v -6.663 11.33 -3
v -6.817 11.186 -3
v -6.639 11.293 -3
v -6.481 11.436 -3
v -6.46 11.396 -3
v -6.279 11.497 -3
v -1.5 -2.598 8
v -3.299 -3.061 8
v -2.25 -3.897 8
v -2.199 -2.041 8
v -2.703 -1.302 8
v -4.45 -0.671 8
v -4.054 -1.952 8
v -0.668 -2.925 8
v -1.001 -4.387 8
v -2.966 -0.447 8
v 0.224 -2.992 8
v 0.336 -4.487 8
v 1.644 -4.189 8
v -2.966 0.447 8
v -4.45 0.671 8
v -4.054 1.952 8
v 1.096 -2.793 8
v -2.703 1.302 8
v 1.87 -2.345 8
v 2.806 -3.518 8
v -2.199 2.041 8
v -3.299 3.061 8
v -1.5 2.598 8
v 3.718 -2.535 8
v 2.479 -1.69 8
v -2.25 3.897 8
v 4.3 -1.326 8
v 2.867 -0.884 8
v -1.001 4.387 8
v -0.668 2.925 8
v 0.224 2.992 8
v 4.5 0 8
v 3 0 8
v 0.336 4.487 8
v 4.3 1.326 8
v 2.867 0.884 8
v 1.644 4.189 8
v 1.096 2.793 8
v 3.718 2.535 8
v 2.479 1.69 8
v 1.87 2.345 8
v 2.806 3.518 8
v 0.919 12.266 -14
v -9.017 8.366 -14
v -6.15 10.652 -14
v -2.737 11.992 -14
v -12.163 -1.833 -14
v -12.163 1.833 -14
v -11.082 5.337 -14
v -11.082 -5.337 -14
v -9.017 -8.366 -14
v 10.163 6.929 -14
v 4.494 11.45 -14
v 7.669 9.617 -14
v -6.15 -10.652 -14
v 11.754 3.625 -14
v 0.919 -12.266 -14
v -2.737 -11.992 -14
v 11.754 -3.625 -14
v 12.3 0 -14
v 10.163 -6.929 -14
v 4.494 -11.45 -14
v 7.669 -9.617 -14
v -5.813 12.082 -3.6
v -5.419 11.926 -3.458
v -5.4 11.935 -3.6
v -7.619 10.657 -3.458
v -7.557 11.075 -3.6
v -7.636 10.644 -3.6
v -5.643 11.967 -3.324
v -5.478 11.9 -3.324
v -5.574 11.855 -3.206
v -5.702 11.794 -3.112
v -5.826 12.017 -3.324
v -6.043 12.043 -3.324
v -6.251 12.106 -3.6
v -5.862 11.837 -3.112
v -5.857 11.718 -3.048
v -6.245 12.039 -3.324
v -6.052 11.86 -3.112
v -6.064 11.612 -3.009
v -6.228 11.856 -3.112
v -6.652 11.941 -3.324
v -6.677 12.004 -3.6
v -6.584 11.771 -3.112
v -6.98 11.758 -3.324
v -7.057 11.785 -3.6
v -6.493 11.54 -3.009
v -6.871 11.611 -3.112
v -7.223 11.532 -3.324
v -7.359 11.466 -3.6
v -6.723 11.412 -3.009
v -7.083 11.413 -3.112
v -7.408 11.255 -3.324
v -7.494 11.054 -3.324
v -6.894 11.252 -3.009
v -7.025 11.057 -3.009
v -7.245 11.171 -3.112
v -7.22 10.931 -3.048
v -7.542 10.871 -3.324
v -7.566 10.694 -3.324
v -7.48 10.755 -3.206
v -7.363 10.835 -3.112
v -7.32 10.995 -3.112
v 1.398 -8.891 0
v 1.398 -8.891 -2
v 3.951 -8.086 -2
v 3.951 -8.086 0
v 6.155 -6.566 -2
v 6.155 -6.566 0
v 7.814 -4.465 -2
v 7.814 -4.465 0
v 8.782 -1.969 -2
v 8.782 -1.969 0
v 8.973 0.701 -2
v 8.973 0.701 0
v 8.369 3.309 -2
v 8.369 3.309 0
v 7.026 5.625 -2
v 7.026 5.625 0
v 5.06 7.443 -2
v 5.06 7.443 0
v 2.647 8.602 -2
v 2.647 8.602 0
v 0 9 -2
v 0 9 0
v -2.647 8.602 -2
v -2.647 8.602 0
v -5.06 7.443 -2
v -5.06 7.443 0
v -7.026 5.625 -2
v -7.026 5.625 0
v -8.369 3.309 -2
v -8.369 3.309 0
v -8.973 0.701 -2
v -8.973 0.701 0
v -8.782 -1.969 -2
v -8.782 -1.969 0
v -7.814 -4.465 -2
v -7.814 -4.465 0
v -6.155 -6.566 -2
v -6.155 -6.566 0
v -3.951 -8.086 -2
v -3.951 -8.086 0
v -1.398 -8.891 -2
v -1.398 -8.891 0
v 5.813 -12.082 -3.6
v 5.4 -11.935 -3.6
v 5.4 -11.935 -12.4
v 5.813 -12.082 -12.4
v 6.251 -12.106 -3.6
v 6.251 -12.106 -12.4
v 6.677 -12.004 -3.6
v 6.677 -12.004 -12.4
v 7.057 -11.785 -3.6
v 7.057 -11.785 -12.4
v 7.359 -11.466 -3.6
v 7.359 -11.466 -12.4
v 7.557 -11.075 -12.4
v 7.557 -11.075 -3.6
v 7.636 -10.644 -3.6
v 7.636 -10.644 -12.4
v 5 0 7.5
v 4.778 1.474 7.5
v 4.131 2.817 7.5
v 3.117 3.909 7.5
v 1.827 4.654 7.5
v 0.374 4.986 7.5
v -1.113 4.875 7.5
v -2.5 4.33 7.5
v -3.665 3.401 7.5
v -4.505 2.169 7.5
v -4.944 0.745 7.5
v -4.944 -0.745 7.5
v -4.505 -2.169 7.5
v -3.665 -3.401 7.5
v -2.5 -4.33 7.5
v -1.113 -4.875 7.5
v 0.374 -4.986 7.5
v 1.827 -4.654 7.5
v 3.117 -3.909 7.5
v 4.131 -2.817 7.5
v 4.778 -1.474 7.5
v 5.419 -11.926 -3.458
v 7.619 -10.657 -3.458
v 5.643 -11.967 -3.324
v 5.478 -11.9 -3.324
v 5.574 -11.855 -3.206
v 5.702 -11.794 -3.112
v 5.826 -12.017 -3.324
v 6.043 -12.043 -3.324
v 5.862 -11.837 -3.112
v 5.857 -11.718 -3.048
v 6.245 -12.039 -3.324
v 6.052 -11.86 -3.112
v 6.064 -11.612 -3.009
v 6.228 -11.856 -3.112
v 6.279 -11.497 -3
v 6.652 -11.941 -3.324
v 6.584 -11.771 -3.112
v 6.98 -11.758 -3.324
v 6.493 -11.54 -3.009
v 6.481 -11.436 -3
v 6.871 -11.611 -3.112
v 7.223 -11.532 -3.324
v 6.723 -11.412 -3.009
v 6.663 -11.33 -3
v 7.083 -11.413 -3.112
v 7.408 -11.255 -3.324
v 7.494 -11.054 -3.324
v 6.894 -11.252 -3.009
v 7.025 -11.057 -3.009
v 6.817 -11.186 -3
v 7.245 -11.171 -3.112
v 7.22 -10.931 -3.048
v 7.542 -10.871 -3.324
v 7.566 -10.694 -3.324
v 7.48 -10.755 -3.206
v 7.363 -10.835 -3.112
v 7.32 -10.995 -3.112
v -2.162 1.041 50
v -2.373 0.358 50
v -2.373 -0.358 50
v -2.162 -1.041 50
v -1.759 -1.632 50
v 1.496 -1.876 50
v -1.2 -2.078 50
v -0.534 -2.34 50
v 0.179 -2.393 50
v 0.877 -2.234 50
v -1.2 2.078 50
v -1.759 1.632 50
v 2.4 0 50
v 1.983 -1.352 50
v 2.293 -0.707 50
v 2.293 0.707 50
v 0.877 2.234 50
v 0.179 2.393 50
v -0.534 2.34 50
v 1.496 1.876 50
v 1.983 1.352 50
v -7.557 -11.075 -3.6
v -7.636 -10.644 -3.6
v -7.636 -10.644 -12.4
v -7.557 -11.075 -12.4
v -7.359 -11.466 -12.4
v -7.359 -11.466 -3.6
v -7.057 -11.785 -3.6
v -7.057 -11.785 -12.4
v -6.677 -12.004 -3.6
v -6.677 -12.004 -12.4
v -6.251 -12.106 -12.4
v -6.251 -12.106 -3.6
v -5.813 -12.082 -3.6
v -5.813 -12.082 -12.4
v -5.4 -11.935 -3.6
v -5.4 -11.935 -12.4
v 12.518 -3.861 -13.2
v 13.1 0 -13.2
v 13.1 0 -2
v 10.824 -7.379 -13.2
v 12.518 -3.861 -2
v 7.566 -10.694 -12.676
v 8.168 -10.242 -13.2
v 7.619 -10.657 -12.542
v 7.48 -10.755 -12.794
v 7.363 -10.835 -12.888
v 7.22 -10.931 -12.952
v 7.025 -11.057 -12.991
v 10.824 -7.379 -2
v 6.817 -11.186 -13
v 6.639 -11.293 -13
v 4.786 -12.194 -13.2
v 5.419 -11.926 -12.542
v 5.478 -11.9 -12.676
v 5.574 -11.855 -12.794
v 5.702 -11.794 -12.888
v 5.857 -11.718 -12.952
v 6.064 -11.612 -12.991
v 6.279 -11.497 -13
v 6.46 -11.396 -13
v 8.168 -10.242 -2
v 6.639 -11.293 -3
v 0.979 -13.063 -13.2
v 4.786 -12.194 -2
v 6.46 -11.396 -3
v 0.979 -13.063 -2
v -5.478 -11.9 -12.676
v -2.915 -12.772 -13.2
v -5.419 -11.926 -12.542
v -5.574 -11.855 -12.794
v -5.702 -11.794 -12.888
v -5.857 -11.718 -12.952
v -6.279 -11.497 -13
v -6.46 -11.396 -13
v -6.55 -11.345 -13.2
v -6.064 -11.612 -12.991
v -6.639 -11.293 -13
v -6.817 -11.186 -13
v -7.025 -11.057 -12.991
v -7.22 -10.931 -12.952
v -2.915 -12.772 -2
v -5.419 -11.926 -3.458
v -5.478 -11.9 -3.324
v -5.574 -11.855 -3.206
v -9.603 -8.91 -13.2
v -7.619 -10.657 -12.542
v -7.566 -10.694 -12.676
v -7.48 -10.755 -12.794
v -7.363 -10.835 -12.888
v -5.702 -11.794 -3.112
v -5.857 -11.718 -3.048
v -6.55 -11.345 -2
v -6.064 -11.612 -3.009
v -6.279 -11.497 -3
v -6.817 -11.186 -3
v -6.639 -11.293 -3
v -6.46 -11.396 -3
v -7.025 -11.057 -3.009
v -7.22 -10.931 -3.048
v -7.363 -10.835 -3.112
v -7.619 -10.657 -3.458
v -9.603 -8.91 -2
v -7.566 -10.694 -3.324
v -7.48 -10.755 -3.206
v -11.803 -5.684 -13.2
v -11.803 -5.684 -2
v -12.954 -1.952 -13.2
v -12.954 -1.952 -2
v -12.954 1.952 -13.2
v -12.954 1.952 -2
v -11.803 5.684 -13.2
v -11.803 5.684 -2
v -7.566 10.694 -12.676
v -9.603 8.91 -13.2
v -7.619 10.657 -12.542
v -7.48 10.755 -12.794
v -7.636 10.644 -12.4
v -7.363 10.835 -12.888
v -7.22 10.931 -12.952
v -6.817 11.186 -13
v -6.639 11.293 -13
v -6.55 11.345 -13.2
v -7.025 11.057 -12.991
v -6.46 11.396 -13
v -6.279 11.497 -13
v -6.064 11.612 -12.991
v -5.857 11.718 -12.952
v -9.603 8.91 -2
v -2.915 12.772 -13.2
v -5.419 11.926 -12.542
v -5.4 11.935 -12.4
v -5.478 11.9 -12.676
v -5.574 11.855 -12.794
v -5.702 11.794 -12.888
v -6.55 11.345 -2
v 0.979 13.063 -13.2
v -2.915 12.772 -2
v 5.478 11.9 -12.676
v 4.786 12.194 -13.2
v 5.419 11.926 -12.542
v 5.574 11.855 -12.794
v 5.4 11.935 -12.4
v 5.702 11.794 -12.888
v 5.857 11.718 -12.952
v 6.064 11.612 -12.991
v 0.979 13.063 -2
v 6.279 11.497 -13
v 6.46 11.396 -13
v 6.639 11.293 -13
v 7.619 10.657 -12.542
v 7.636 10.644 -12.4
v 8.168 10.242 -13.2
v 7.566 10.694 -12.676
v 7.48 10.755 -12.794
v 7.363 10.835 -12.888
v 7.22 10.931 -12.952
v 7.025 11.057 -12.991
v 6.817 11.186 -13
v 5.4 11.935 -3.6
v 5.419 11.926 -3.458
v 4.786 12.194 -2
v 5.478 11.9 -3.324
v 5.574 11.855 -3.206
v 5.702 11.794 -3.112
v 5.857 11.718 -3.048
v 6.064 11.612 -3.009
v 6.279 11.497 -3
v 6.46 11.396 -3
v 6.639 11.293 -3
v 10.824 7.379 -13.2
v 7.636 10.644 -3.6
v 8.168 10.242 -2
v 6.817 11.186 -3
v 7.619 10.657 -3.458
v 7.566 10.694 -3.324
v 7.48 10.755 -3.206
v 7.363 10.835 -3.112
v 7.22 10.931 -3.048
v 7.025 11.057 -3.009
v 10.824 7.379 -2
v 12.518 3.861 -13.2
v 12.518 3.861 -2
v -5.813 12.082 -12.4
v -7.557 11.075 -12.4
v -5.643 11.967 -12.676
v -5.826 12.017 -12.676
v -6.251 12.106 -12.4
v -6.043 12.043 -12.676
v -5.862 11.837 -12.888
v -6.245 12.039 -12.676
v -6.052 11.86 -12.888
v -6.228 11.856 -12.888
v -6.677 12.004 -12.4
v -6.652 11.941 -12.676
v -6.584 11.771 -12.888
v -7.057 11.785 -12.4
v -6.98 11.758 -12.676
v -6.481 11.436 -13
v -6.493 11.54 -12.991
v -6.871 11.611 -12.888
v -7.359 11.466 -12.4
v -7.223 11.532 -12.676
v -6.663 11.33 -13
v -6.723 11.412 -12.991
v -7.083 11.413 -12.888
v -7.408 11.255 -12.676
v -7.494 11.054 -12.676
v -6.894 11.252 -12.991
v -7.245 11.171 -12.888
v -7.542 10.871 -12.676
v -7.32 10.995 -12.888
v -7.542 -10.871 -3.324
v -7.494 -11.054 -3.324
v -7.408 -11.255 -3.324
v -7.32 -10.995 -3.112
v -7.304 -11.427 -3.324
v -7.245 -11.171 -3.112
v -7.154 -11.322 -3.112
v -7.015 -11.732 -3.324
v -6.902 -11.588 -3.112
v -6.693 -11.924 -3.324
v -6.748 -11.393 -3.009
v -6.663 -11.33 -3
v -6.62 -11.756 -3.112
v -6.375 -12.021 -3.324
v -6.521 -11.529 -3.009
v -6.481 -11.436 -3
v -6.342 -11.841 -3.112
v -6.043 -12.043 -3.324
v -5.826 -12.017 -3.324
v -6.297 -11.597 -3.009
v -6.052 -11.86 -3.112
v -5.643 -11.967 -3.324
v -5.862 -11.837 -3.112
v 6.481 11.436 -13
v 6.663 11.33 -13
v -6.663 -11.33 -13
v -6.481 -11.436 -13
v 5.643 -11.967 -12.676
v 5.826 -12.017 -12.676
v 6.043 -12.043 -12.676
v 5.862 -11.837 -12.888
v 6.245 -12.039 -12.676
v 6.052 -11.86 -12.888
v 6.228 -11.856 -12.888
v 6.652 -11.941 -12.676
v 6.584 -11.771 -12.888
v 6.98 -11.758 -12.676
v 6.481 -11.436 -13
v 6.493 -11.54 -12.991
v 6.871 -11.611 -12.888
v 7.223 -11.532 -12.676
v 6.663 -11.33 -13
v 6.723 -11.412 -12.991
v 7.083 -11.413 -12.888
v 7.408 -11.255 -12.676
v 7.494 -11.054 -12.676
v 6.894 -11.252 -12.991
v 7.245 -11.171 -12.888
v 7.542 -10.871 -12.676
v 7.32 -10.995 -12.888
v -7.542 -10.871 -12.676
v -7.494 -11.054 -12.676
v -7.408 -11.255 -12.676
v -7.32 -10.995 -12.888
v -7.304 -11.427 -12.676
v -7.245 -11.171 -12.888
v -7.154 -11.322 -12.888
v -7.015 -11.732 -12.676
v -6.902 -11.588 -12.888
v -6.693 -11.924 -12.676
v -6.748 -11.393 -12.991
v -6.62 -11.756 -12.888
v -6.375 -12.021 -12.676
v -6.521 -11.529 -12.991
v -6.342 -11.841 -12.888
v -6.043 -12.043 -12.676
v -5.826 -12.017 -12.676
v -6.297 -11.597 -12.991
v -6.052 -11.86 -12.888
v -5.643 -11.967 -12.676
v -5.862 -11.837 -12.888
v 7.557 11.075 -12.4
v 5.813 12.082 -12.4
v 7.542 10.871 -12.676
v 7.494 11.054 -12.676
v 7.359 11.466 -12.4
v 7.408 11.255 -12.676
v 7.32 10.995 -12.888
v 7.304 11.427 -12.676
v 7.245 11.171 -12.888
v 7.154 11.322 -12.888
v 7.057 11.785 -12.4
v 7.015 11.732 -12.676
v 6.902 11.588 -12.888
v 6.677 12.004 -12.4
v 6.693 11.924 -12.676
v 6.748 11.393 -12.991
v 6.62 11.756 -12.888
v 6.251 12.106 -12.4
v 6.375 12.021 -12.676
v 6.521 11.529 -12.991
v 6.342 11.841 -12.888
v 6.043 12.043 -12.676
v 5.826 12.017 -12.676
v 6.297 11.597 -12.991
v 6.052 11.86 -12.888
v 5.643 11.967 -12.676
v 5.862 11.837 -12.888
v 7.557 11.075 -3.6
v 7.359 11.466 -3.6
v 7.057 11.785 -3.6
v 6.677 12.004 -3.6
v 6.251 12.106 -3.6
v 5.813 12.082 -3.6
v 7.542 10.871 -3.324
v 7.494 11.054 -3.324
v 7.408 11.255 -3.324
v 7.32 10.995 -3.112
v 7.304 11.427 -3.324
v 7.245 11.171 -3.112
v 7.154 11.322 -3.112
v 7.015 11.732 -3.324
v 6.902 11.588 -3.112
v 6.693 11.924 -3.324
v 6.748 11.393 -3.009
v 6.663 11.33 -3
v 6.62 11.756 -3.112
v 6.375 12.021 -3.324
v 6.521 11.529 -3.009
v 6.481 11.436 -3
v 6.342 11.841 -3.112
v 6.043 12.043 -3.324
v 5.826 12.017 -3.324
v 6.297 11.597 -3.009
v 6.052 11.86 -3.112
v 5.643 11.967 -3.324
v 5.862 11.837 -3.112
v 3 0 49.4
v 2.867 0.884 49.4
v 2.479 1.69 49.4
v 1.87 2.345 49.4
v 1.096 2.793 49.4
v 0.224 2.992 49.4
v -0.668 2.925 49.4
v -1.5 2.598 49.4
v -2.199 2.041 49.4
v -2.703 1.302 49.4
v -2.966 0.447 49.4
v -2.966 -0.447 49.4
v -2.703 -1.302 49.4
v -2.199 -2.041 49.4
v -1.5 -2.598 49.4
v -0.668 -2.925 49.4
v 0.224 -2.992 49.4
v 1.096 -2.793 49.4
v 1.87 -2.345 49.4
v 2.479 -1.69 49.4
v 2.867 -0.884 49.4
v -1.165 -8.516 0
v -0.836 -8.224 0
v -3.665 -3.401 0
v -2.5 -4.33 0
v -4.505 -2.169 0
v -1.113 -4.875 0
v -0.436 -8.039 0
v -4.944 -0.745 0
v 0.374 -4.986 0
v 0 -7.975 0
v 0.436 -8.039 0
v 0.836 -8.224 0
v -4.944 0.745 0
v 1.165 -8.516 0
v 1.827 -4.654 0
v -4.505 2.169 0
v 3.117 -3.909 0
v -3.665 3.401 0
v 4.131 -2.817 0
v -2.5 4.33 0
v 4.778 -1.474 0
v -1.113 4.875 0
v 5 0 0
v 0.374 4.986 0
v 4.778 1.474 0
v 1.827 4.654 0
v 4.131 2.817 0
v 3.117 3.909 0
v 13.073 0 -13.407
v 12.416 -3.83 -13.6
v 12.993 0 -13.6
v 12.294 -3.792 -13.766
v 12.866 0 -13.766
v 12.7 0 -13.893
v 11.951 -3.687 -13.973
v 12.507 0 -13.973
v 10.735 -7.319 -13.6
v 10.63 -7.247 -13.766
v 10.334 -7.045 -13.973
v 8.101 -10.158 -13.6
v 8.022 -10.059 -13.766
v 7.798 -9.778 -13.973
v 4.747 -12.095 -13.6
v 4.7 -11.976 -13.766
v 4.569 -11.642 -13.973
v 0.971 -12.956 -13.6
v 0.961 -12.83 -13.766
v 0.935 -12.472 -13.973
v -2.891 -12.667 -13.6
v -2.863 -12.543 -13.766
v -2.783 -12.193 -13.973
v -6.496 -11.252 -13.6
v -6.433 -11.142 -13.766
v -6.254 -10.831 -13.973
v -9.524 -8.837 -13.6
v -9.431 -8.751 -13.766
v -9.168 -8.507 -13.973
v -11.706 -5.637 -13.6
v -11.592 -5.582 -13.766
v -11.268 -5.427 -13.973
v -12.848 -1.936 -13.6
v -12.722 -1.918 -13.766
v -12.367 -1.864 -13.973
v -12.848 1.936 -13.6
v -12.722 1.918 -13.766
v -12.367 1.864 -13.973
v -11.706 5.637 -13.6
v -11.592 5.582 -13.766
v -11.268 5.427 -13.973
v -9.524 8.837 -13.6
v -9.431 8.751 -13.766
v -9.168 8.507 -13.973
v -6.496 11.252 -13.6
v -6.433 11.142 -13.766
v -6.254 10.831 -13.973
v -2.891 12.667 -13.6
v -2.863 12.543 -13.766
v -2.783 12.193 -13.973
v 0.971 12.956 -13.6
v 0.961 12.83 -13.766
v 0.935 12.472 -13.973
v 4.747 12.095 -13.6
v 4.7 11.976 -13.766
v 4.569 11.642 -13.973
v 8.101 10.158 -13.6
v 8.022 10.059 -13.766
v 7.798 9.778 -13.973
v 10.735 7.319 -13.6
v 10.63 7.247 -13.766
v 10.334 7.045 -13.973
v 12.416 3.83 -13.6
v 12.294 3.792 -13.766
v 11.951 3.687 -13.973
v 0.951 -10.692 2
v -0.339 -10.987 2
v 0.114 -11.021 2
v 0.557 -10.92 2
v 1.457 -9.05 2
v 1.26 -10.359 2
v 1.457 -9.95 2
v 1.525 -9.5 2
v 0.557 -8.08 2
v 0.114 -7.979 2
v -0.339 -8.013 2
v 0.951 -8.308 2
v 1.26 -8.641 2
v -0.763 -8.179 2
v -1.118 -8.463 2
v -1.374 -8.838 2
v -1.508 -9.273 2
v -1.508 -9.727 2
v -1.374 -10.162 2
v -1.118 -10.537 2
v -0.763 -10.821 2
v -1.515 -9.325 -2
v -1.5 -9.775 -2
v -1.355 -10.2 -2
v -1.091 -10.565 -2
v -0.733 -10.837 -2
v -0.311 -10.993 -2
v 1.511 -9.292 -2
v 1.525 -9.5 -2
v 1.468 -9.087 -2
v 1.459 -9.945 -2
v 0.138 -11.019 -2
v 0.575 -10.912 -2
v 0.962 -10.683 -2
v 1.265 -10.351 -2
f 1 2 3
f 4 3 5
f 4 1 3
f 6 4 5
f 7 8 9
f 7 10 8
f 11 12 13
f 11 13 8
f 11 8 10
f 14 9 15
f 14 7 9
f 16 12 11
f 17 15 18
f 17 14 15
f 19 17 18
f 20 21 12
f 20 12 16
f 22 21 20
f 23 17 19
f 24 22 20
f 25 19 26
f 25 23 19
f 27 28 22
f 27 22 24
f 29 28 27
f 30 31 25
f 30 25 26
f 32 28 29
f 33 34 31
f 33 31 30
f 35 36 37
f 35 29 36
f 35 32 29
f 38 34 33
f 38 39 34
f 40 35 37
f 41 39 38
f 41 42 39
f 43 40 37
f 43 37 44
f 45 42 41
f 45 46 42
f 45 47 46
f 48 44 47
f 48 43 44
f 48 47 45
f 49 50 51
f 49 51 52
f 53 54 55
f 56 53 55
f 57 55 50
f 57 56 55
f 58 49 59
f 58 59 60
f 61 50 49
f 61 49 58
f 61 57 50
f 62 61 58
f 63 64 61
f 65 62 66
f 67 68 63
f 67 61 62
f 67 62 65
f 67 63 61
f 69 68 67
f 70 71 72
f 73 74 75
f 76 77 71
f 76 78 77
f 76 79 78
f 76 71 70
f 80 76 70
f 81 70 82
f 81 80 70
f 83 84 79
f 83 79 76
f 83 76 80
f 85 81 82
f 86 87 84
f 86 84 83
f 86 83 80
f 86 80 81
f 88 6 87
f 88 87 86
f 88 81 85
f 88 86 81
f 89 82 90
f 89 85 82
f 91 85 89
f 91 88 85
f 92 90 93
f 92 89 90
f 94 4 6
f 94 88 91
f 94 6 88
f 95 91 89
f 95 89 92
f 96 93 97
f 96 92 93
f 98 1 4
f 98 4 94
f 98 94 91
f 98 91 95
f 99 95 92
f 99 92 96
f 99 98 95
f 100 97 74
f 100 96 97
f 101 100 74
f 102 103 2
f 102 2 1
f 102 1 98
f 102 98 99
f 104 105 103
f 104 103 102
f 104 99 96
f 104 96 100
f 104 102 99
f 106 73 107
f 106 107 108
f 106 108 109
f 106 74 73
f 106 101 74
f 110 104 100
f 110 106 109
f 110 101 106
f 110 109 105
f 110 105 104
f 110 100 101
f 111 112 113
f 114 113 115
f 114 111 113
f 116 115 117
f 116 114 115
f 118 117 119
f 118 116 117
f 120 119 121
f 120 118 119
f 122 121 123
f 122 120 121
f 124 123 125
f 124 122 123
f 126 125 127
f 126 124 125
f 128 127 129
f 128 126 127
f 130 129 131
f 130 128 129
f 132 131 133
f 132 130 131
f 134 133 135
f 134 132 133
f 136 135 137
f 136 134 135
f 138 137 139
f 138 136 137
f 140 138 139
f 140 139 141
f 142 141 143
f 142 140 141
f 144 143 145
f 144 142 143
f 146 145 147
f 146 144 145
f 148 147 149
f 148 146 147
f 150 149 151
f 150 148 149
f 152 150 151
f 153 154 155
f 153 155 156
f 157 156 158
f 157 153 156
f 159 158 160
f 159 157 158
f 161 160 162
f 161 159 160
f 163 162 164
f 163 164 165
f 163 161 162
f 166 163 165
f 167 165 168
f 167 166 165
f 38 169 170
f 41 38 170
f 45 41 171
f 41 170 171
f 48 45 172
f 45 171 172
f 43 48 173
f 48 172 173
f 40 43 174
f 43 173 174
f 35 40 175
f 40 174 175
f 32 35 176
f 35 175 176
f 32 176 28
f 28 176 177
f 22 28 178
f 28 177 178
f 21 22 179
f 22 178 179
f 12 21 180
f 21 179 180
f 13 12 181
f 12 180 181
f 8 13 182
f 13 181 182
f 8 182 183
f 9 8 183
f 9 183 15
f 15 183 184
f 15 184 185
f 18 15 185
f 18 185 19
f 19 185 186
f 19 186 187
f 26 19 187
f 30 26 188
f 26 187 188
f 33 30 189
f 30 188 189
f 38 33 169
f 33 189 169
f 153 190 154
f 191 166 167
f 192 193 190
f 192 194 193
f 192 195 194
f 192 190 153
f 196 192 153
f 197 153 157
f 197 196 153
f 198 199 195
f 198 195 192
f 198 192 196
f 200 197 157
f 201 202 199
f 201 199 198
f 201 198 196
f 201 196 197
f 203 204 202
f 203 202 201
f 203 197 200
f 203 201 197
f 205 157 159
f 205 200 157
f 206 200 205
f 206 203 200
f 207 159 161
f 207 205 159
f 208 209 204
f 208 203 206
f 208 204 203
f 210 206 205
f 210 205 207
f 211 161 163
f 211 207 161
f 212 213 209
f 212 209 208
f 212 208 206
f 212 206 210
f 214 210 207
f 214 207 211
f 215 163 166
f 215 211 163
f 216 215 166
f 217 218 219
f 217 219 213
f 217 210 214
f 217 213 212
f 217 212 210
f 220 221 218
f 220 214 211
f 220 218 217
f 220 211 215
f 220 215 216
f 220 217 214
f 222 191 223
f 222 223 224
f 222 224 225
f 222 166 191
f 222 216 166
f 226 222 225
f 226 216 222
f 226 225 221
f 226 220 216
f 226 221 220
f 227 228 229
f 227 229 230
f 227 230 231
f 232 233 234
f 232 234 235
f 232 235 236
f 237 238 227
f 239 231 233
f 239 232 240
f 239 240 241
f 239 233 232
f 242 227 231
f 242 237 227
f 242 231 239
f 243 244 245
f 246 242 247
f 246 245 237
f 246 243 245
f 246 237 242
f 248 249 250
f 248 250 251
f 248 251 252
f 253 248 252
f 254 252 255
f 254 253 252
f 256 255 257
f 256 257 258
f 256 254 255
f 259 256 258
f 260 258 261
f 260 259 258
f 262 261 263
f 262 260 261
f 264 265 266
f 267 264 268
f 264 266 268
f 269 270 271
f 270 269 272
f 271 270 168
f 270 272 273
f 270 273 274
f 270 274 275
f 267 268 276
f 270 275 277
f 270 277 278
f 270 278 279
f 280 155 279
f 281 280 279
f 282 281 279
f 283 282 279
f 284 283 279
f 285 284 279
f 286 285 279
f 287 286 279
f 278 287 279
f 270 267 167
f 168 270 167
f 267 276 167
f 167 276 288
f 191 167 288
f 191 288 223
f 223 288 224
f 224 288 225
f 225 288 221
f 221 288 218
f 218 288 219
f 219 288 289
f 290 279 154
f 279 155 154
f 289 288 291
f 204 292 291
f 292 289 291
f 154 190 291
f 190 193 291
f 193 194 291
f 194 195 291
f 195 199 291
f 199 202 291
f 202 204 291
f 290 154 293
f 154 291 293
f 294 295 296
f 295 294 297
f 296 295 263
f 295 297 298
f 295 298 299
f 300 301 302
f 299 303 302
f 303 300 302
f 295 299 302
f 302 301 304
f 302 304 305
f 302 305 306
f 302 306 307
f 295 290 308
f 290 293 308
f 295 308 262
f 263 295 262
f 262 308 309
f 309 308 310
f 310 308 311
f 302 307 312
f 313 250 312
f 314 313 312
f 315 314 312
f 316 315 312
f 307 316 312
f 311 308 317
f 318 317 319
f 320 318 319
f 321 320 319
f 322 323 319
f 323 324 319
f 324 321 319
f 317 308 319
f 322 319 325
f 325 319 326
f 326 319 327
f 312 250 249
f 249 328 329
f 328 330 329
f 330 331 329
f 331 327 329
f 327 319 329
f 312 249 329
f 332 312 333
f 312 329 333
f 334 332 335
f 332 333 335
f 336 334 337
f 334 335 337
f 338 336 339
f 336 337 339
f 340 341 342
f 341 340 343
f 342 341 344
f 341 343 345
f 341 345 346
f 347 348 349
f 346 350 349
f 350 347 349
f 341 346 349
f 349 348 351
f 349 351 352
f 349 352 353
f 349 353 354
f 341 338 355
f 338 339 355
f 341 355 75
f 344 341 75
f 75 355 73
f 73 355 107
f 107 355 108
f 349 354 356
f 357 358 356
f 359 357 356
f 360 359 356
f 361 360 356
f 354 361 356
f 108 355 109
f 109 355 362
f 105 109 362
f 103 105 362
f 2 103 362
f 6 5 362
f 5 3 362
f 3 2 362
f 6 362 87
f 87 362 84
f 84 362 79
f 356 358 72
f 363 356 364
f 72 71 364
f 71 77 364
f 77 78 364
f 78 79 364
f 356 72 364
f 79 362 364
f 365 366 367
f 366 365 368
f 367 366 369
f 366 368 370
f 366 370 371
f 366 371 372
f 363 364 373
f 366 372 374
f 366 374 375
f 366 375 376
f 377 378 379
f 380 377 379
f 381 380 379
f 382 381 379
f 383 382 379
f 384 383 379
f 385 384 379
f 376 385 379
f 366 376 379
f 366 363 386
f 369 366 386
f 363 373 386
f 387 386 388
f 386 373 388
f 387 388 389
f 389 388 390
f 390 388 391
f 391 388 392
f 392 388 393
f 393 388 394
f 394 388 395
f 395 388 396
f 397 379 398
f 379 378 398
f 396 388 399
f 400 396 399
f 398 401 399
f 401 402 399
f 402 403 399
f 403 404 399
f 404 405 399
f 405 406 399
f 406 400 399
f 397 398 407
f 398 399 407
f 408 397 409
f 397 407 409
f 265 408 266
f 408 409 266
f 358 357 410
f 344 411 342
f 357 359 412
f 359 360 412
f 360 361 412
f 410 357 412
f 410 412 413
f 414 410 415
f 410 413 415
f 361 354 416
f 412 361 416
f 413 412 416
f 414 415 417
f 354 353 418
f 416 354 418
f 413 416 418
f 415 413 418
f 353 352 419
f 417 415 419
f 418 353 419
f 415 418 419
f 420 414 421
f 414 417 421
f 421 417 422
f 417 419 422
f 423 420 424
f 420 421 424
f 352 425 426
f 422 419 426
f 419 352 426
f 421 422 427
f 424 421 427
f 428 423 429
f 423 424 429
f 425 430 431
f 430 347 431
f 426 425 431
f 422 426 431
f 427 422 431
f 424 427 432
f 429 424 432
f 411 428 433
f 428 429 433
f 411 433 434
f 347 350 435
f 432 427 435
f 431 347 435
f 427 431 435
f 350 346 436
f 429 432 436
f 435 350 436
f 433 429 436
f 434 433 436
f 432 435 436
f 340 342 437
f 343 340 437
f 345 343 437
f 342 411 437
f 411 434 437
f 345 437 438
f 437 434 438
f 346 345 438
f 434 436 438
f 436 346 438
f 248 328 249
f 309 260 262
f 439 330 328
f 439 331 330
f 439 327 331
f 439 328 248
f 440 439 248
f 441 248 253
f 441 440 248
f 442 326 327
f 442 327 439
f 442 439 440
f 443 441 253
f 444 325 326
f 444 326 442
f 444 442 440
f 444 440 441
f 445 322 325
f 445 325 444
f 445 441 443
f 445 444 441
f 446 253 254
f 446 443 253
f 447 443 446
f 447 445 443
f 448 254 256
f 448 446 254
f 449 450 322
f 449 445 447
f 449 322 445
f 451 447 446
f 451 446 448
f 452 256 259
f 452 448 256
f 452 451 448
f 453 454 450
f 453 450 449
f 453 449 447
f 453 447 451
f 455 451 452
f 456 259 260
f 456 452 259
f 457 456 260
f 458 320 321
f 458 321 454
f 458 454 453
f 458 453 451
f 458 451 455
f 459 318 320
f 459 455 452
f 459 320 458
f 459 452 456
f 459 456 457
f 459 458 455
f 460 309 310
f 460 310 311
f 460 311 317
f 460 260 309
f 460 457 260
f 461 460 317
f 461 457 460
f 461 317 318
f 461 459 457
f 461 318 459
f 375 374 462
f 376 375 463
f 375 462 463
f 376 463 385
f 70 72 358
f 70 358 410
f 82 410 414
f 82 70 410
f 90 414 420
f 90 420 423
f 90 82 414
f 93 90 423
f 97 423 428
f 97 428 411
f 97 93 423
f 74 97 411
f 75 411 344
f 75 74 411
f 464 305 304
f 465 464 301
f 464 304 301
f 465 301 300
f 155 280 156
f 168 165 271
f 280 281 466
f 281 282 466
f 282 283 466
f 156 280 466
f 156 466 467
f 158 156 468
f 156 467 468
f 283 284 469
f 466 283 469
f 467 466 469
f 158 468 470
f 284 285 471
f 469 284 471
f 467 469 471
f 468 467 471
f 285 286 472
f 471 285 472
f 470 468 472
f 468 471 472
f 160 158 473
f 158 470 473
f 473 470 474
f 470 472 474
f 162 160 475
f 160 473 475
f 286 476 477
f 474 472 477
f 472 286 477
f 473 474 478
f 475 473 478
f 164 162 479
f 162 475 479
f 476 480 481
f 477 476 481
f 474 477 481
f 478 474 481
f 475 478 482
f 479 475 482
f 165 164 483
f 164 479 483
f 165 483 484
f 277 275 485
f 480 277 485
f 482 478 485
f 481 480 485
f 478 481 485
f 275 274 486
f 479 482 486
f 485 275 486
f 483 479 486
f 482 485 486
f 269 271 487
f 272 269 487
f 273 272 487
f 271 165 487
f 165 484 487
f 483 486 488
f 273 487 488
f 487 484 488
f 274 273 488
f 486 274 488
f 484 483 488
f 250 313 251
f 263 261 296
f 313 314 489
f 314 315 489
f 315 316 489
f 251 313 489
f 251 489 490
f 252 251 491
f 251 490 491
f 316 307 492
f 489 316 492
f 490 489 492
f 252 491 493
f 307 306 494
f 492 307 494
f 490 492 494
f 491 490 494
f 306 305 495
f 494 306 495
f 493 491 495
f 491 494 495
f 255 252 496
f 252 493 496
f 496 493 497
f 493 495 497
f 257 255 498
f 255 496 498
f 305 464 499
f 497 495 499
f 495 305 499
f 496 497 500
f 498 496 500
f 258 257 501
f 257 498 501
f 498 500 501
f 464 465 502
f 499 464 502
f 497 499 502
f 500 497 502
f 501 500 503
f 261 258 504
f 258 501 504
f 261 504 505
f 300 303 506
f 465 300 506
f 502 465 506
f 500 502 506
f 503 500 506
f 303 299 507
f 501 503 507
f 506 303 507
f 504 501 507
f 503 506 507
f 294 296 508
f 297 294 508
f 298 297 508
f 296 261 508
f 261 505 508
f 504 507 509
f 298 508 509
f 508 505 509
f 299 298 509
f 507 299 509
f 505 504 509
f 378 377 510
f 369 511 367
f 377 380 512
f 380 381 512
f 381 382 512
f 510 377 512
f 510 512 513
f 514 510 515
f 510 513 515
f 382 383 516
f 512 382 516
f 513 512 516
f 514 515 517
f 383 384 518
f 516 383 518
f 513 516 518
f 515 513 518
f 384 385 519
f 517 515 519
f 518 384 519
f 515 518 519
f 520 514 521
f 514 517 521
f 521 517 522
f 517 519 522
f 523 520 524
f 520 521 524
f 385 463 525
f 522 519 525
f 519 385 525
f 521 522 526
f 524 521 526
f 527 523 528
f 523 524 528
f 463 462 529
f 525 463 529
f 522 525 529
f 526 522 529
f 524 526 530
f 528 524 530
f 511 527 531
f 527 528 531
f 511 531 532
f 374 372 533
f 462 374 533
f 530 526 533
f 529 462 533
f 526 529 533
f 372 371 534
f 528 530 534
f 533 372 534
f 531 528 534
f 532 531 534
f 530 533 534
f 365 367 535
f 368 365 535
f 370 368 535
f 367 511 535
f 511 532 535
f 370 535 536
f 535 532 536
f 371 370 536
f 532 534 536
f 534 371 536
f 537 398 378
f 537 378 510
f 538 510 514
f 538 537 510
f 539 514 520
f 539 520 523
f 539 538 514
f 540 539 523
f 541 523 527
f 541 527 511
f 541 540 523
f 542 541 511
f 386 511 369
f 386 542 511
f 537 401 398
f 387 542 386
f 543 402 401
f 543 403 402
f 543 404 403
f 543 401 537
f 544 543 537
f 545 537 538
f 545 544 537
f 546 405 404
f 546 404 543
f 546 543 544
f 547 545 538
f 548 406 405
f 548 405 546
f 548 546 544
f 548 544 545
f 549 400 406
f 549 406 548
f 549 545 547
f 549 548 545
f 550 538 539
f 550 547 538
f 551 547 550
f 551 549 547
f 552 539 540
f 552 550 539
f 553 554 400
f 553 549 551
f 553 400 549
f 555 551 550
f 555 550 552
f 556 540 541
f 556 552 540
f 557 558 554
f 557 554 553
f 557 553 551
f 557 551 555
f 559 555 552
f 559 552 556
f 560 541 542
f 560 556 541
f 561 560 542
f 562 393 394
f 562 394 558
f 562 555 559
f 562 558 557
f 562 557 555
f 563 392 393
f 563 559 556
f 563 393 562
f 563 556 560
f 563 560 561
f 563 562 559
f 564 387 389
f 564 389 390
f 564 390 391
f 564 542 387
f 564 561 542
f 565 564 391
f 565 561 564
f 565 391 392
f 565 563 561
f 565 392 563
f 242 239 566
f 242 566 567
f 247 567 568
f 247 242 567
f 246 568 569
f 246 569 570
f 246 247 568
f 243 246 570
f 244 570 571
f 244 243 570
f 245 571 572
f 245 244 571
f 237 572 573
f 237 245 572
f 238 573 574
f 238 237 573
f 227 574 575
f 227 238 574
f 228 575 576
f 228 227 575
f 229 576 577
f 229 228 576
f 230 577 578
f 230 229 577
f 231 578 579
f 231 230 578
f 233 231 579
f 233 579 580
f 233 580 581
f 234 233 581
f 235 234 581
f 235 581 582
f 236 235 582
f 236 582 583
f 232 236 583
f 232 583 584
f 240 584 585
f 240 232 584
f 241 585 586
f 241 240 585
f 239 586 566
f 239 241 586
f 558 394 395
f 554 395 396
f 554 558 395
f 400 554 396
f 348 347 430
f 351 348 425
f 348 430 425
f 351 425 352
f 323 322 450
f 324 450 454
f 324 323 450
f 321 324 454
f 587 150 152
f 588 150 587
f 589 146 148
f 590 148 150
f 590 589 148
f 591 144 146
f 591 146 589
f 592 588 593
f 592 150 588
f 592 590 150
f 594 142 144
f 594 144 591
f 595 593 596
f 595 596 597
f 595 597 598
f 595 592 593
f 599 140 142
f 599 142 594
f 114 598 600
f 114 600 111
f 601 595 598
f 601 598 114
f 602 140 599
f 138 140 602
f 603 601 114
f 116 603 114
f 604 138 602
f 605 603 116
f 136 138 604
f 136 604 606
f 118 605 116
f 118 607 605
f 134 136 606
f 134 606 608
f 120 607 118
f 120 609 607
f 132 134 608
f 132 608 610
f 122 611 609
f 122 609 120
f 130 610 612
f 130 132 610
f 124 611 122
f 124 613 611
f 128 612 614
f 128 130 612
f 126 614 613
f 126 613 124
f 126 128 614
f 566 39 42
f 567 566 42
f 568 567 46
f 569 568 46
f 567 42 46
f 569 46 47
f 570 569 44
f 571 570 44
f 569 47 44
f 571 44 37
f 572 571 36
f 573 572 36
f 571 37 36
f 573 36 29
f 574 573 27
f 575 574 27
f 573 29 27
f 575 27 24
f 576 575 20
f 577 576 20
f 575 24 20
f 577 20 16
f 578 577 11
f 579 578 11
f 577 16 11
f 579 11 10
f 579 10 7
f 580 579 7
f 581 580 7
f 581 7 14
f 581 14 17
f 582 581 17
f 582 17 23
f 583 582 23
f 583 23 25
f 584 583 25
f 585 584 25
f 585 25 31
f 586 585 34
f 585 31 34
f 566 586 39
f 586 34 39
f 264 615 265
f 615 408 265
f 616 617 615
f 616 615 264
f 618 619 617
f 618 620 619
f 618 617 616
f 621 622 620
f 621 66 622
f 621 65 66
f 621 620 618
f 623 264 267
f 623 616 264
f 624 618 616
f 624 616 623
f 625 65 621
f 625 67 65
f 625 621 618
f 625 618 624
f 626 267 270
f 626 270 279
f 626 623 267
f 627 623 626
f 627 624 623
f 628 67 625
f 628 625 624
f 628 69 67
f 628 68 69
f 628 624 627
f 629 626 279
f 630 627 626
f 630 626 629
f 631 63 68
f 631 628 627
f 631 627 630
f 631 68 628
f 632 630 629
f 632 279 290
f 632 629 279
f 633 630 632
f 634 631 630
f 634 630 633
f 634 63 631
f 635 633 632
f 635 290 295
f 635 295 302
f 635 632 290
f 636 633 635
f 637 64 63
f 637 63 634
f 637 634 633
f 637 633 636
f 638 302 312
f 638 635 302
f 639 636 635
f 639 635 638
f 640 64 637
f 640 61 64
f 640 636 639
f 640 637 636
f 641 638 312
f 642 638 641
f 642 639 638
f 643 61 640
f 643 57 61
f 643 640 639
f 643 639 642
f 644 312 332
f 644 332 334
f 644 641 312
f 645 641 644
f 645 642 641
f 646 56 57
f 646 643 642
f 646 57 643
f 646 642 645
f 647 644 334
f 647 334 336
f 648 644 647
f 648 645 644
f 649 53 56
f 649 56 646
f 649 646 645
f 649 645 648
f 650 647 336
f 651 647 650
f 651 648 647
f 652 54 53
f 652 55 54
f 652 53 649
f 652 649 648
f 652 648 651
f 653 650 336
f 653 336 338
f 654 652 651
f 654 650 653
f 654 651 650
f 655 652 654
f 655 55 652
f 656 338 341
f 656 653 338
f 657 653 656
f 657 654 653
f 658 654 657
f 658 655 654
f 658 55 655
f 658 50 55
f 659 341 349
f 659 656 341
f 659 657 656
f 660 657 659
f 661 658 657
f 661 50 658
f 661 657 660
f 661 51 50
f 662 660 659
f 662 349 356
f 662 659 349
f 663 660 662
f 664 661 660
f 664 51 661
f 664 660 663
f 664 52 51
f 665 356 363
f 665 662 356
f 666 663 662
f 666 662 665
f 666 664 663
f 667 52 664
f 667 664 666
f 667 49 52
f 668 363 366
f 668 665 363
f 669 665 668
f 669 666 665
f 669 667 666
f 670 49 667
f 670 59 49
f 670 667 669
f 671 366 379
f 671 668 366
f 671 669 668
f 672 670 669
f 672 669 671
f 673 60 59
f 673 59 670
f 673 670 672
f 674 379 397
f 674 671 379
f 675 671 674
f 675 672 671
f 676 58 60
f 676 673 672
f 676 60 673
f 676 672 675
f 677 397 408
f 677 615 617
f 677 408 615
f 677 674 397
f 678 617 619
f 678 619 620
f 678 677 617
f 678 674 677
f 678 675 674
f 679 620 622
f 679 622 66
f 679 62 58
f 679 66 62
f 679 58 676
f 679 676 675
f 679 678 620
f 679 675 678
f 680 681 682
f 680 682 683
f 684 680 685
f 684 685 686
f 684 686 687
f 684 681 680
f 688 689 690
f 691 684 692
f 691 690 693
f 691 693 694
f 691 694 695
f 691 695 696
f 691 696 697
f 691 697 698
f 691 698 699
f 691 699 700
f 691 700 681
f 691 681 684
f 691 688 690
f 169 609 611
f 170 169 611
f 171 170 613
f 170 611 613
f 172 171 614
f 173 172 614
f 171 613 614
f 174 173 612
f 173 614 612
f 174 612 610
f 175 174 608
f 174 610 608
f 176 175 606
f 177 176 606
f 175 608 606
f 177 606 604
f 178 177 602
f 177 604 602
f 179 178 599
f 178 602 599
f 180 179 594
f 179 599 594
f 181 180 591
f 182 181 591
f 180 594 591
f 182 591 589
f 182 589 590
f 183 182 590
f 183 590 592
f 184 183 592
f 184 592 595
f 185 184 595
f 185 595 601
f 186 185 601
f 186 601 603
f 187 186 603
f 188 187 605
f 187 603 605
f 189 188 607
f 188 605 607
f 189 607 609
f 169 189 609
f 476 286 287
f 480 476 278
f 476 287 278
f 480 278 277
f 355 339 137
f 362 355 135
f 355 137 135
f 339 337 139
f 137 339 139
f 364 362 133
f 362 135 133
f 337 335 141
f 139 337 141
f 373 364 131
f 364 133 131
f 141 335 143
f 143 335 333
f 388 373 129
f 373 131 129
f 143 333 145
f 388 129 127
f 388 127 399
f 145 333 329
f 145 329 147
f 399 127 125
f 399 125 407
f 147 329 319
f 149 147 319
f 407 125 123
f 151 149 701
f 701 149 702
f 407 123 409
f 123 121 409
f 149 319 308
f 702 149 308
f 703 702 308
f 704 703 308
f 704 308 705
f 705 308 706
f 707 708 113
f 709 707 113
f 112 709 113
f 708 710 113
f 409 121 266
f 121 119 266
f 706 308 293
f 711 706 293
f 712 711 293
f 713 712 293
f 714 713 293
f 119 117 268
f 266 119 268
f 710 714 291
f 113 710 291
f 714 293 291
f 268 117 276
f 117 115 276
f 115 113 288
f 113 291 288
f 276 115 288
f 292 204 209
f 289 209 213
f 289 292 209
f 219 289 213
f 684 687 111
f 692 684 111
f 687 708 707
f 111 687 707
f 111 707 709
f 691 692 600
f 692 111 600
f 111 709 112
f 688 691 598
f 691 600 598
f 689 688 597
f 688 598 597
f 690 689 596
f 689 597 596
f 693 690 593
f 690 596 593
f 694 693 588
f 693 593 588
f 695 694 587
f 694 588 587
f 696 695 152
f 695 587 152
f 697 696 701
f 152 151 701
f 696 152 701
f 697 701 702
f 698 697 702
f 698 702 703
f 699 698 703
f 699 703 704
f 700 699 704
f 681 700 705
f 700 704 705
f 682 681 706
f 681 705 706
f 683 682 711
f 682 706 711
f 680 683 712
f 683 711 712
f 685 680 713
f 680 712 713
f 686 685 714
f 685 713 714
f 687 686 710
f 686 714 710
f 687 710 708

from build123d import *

# Parameters (mm, degrees)
SKETCH_R        = 9
PAD_DEPTH       = 2
SKETCH001_R     = 13.1
PAD001_DEPTH    = 5
SKETCH002_R     = 13.1
PAD002_DEPTH    = 7
SKETCH003_R     = 1.525
PAD003_DEPTH    = 4
SKETCH004_R     = 5
PAD004_DEPTH    = 8
SKETCH005_R     = 3
PAD005_DEPTH    = 42
SKETCH006_R     = 1.525
PAD006_DEPTH    = 10
FILLET_R        = 0.6
FILLET001_R     = 0.8
CHAMFER_SIZE    = 0.6
CHAMFER001_SIZE = 0.5


with BuildPart() as part:
    # Sketch → Pad (new body)
    with BuildSketch(Plane.XY):
        Circle(SKETCH_R)
    extrude(amount=-PAD_DEPTH)

    # Sketch001 (on Face3 of Pad) → Pad001 (join)
    with BuildSketch(Plane(origin=(0, 0, -2), x_dir=(1, 0, 0), z_dir=(0, 0, -1))):
        Circle(SKETCH001_R)
    extrude(amount=PAD001_DEPTH)

    # Sketch002 (on Face3 of Pad001) → Pad002 (join)
    with BuildSketch(Plane(origin=(0, 0, -7), x_dir=(1, 0, 0), z_dir=(0, 0, -1))):
        Circle(SKETCH002_R)
    extrude(amount=PAD002_DEPTH)

    # Sketch003 (on Face2 of Pad002) → Pad003 (join)
    with BuildSketch(Plane.XY.offset(-2)):
        with Locations((0, -9.5)):
            Circle(SKETCH003_R)
    extrude(amount=PAD003_DEPTH)

    # Sketch004 (on Face8 of Pad003) → Pad004 (join)
    with BuildSketch(Plane.XY):
        Circle(SKETCH004_R)
    extrude(amount=PAD004_DEPTH)

    # Sketch005 (on Face11 of Pad004) → Pad005 (join)
    with BuildSketch(Plane.XY.offset(8)):
        Circle(SKETCH005_R)
    extrude(amount=PAD005_DEPTH)

    # Sketch006 (on Face2 of Pad005) → Pad006 (join)
    with BuildSketch(Plane.XY.offset(-3)):
        with Locations((-6.1125, 10.587161)):
            Circle(SKETCH006_R)
        with Locations((6.1125, -10.587161)):
            Circle(SKETCH006_R)
        with Locations((6.1125, 10.587161)):
            Circle(SKETCH006_R)
        with Locations((-6.1125, -10.587161)):
            Circle(SKETCH006_R)
    extrude(amount=-PAD006_DEPTH)

    # Fillet
    fillet_edges = [part.edges().sort_by_distance(p)[0] for p in [
        (-6.875, -11.90785, -3),
        (-6.875, -11.90785, -13),
        (6.875, -11.90785, -3),
        (6.875, -11.90785, -13),
        (6.875, 11.90785, -3),
        (-6.875, 11.90785, -3),
        (6.875, 11.90785, -13),
        (-6.875, 11.90785, -13),
    ]]
    fillet(fillet_edges, radius=FILLET_R)

    # Fillet001
    fillet001_edges = [part.edges().sort_by_distance(p)[0] for p in [
        (-13.1, 0, -14),
    ]]
    fillet(fillet001_edges, radius=FILLET001_R)

    # Chamfer
    chamfer_edges = [part.edges().sort_by_distance(p)[0] for p in [
        (-3, 0, 50),
    ]]
    chamfer(chamfer_edges, length=CHAMFER_SIZE)

    # Chamfer001
    chamfer001_edges = [part.edges().sort_by_distance(p)[0] for p in [
        (-5, 0, 8),
    ]]
    chamfer(chamfer001_edges, length=CHAMFER001_SIZE)


solid = part.part
